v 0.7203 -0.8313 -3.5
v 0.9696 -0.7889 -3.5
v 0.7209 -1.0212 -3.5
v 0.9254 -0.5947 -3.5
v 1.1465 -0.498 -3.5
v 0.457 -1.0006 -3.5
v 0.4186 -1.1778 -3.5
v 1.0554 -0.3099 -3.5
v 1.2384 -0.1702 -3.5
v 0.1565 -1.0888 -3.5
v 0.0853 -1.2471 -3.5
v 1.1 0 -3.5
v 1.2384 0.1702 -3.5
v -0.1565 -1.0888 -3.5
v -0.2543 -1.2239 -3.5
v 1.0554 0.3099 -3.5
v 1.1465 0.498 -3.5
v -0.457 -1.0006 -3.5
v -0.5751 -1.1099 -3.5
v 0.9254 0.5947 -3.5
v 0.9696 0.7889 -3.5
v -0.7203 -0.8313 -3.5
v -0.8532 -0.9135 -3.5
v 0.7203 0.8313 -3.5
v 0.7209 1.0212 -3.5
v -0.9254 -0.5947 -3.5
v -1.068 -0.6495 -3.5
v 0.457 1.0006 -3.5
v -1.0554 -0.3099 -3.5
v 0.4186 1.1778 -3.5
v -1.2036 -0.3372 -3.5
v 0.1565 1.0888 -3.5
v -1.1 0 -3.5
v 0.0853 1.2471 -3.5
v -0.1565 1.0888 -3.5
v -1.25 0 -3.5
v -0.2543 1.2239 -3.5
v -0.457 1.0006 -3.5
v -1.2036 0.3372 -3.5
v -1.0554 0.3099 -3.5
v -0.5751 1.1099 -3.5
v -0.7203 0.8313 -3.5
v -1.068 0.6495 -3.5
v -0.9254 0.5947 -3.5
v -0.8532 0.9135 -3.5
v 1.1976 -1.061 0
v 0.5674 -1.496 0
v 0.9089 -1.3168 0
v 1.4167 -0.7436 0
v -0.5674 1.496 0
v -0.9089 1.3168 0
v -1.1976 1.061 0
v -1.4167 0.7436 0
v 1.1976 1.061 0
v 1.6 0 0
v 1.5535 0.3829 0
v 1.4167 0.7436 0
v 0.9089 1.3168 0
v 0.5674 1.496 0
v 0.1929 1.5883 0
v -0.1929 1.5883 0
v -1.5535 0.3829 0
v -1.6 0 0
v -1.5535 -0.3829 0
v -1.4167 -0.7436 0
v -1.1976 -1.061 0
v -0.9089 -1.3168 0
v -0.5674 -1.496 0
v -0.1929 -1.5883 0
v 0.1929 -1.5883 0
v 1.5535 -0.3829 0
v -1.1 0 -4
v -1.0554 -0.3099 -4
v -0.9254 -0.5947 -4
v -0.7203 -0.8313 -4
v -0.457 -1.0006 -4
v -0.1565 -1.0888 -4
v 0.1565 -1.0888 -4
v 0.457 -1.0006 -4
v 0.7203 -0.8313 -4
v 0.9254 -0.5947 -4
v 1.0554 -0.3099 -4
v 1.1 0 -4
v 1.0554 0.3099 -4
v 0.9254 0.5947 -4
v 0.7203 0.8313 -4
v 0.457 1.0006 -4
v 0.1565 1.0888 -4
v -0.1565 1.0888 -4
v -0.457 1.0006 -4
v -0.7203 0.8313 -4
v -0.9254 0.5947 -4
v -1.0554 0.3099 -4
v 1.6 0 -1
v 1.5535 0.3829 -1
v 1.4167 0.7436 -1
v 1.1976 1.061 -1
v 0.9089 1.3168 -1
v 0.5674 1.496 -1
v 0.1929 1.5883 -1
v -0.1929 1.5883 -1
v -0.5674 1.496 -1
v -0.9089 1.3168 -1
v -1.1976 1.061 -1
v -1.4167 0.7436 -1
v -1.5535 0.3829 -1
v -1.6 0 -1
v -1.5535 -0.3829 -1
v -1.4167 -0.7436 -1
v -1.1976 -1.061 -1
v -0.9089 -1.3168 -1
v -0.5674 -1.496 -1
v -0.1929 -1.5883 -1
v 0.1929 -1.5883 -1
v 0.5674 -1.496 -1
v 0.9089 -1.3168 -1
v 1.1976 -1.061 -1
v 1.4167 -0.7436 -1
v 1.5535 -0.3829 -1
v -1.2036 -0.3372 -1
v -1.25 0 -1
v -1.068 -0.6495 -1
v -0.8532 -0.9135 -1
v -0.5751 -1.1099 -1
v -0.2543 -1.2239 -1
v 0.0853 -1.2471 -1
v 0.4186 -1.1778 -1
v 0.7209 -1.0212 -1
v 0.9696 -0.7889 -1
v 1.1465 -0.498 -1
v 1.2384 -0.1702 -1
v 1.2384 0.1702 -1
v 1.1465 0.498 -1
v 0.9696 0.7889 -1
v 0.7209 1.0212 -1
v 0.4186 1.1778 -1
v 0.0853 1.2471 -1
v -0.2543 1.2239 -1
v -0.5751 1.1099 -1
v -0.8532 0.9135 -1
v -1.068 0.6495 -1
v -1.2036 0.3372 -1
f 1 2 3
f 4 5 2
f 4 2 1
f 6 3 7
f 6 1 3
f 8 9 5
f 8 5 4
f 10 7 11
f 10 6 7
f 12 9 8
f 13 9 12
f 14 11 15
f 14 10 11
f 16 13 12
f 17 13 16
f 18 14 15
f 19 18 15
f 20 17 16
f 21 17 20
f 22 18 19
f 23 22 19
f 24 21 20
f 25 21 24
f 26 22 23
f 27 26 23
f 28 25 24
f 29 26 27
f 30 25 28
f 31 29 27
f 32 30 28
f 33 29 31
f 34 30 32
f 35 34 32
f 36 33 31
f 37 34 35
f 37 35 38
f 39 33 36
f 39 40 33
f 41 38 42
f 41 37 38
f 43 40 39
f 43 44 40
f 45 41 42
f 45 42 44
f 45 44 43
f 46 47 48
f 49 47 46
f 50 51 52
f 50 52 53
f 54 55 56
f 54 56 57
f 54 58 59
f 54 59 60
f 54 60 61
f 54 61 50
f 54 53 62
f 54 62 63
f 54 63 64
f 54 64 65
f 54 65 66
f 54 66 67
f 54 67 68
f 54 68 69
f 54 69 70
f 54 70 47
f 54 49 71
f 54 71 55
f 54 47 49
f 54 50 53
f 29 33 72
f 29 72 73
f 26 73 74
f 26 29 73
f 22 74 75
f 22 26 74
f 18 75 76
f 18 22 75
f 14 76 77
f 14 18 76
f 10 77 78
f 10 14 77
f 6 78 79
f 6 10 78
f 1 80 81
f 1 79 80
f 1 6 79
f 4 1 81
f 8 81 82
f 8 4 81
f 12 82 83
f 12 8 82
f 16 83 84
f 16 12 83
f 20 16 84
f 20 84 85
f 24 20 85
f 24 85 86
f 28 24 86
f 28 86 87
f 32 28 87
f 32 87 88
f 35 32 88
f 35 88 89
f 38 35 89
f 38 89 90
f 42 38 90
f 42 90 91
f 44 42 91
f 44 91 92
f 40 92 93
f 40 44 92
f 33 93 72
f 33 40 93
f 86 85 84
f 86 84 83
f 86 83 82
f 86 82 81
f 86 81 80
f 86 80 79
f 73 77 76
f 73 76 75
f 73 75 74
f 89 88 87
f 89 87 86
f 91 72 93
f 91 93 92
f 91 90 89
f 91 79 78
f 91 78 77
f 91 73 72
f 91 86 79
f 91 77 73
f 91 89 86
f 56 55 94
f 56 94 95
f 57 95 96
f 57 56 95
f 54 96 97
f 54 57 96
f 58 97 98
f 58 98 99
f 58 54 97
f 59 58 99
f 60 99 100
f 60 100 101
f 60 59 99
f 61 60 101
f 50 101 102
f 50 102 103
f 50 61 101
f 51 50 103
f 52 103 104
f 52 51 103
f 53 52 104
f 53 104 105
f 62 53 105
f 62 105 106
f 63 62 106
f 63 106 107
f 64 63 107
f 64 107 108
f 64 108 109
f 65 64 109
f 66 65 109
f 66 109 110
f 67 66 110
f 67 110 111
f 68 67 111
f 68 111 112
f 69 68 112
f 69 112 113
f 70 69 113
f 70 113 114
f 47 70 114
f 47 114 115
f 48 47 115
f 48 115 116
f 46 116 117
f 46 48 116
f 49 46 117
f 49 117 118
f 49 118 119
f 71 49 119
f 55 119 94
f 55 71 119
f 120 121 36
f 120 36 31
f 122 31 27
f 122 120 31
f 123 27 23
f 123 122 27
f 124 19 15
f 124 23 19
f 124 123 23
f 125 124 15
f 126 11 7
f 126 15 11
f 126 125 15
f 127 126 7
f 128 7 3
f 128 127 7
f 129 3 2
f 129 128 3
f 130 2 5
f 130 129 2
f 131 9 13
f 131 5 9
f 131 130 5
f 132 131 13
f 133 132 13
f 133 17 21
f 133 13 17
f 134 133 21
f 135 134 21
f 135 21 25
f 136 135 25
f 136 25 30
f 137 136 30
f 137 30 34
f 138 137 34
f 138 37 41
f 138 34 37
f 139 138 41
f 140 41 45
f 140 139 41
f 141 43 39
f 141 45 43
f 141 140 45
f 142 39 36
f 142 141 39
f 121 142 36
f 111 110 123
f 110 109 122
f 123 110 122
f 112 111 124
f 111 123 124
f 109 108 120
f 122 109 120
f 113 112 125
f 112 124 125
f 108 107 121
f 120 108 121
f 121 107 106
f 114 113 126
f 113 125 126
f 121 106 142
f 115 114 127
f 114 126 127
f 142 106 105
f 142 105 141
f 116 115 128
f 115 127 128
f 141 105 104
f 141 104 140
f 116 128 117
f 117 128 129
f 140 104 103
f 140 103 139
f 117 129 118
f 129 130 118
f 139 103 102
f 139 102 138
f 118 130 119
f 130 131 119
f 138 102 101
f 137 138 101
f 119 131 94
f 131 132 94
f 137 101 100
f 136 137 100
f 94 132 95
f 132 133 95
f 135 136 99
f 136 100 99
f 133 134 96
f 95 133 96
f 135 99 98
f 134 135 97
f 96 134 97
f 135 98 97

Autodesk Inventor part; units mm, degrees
ref_plane "YZ Plane" through (0, 0, 0) normal (1, 0, 0) x (0, 1, 0)
ref_plane "XZ Plane" through (0, 0, 0) normal (0, 1, 0) x (-1, 0, 0)
ref_plane "XY Plane" through (0, 0, 0) normal (0, 0, 1) x (1, 0, 0)
sketch "Esboço1" plane through (0, 0, 0) normal (0, 0, 1) x (1, 0, 0)
  circle A0 centre (0, 0) radius 1.6
  dimension "d0" = 3.2
extrude "Extrusão1" add sketch "Esboço1" against normal blind 1
sketch "Esboço2" plane through (0, 0, -1) normal (0, 0, -1) x (-1, 0, 0)
  circle A0 centre (0, 0) radius 1.25
  dimension "d3" = 2.5
extrude "Extrusão2" add sketch "Esboço2" along normal blind 2.5
sketch "Esboço3" plane through (0, 0, -3.5) normal (0, 0, -1) x (-1, 0, 0)
  circle A0 centre (0, 0) radius 1.1
  dimension "d6" = 2.2
extrude "Extrusão3" add sketch "Esboço3" along normal blind 0.5
properties part number "Ra-Manager_Light_Pipe" material "Plástico SAN"
